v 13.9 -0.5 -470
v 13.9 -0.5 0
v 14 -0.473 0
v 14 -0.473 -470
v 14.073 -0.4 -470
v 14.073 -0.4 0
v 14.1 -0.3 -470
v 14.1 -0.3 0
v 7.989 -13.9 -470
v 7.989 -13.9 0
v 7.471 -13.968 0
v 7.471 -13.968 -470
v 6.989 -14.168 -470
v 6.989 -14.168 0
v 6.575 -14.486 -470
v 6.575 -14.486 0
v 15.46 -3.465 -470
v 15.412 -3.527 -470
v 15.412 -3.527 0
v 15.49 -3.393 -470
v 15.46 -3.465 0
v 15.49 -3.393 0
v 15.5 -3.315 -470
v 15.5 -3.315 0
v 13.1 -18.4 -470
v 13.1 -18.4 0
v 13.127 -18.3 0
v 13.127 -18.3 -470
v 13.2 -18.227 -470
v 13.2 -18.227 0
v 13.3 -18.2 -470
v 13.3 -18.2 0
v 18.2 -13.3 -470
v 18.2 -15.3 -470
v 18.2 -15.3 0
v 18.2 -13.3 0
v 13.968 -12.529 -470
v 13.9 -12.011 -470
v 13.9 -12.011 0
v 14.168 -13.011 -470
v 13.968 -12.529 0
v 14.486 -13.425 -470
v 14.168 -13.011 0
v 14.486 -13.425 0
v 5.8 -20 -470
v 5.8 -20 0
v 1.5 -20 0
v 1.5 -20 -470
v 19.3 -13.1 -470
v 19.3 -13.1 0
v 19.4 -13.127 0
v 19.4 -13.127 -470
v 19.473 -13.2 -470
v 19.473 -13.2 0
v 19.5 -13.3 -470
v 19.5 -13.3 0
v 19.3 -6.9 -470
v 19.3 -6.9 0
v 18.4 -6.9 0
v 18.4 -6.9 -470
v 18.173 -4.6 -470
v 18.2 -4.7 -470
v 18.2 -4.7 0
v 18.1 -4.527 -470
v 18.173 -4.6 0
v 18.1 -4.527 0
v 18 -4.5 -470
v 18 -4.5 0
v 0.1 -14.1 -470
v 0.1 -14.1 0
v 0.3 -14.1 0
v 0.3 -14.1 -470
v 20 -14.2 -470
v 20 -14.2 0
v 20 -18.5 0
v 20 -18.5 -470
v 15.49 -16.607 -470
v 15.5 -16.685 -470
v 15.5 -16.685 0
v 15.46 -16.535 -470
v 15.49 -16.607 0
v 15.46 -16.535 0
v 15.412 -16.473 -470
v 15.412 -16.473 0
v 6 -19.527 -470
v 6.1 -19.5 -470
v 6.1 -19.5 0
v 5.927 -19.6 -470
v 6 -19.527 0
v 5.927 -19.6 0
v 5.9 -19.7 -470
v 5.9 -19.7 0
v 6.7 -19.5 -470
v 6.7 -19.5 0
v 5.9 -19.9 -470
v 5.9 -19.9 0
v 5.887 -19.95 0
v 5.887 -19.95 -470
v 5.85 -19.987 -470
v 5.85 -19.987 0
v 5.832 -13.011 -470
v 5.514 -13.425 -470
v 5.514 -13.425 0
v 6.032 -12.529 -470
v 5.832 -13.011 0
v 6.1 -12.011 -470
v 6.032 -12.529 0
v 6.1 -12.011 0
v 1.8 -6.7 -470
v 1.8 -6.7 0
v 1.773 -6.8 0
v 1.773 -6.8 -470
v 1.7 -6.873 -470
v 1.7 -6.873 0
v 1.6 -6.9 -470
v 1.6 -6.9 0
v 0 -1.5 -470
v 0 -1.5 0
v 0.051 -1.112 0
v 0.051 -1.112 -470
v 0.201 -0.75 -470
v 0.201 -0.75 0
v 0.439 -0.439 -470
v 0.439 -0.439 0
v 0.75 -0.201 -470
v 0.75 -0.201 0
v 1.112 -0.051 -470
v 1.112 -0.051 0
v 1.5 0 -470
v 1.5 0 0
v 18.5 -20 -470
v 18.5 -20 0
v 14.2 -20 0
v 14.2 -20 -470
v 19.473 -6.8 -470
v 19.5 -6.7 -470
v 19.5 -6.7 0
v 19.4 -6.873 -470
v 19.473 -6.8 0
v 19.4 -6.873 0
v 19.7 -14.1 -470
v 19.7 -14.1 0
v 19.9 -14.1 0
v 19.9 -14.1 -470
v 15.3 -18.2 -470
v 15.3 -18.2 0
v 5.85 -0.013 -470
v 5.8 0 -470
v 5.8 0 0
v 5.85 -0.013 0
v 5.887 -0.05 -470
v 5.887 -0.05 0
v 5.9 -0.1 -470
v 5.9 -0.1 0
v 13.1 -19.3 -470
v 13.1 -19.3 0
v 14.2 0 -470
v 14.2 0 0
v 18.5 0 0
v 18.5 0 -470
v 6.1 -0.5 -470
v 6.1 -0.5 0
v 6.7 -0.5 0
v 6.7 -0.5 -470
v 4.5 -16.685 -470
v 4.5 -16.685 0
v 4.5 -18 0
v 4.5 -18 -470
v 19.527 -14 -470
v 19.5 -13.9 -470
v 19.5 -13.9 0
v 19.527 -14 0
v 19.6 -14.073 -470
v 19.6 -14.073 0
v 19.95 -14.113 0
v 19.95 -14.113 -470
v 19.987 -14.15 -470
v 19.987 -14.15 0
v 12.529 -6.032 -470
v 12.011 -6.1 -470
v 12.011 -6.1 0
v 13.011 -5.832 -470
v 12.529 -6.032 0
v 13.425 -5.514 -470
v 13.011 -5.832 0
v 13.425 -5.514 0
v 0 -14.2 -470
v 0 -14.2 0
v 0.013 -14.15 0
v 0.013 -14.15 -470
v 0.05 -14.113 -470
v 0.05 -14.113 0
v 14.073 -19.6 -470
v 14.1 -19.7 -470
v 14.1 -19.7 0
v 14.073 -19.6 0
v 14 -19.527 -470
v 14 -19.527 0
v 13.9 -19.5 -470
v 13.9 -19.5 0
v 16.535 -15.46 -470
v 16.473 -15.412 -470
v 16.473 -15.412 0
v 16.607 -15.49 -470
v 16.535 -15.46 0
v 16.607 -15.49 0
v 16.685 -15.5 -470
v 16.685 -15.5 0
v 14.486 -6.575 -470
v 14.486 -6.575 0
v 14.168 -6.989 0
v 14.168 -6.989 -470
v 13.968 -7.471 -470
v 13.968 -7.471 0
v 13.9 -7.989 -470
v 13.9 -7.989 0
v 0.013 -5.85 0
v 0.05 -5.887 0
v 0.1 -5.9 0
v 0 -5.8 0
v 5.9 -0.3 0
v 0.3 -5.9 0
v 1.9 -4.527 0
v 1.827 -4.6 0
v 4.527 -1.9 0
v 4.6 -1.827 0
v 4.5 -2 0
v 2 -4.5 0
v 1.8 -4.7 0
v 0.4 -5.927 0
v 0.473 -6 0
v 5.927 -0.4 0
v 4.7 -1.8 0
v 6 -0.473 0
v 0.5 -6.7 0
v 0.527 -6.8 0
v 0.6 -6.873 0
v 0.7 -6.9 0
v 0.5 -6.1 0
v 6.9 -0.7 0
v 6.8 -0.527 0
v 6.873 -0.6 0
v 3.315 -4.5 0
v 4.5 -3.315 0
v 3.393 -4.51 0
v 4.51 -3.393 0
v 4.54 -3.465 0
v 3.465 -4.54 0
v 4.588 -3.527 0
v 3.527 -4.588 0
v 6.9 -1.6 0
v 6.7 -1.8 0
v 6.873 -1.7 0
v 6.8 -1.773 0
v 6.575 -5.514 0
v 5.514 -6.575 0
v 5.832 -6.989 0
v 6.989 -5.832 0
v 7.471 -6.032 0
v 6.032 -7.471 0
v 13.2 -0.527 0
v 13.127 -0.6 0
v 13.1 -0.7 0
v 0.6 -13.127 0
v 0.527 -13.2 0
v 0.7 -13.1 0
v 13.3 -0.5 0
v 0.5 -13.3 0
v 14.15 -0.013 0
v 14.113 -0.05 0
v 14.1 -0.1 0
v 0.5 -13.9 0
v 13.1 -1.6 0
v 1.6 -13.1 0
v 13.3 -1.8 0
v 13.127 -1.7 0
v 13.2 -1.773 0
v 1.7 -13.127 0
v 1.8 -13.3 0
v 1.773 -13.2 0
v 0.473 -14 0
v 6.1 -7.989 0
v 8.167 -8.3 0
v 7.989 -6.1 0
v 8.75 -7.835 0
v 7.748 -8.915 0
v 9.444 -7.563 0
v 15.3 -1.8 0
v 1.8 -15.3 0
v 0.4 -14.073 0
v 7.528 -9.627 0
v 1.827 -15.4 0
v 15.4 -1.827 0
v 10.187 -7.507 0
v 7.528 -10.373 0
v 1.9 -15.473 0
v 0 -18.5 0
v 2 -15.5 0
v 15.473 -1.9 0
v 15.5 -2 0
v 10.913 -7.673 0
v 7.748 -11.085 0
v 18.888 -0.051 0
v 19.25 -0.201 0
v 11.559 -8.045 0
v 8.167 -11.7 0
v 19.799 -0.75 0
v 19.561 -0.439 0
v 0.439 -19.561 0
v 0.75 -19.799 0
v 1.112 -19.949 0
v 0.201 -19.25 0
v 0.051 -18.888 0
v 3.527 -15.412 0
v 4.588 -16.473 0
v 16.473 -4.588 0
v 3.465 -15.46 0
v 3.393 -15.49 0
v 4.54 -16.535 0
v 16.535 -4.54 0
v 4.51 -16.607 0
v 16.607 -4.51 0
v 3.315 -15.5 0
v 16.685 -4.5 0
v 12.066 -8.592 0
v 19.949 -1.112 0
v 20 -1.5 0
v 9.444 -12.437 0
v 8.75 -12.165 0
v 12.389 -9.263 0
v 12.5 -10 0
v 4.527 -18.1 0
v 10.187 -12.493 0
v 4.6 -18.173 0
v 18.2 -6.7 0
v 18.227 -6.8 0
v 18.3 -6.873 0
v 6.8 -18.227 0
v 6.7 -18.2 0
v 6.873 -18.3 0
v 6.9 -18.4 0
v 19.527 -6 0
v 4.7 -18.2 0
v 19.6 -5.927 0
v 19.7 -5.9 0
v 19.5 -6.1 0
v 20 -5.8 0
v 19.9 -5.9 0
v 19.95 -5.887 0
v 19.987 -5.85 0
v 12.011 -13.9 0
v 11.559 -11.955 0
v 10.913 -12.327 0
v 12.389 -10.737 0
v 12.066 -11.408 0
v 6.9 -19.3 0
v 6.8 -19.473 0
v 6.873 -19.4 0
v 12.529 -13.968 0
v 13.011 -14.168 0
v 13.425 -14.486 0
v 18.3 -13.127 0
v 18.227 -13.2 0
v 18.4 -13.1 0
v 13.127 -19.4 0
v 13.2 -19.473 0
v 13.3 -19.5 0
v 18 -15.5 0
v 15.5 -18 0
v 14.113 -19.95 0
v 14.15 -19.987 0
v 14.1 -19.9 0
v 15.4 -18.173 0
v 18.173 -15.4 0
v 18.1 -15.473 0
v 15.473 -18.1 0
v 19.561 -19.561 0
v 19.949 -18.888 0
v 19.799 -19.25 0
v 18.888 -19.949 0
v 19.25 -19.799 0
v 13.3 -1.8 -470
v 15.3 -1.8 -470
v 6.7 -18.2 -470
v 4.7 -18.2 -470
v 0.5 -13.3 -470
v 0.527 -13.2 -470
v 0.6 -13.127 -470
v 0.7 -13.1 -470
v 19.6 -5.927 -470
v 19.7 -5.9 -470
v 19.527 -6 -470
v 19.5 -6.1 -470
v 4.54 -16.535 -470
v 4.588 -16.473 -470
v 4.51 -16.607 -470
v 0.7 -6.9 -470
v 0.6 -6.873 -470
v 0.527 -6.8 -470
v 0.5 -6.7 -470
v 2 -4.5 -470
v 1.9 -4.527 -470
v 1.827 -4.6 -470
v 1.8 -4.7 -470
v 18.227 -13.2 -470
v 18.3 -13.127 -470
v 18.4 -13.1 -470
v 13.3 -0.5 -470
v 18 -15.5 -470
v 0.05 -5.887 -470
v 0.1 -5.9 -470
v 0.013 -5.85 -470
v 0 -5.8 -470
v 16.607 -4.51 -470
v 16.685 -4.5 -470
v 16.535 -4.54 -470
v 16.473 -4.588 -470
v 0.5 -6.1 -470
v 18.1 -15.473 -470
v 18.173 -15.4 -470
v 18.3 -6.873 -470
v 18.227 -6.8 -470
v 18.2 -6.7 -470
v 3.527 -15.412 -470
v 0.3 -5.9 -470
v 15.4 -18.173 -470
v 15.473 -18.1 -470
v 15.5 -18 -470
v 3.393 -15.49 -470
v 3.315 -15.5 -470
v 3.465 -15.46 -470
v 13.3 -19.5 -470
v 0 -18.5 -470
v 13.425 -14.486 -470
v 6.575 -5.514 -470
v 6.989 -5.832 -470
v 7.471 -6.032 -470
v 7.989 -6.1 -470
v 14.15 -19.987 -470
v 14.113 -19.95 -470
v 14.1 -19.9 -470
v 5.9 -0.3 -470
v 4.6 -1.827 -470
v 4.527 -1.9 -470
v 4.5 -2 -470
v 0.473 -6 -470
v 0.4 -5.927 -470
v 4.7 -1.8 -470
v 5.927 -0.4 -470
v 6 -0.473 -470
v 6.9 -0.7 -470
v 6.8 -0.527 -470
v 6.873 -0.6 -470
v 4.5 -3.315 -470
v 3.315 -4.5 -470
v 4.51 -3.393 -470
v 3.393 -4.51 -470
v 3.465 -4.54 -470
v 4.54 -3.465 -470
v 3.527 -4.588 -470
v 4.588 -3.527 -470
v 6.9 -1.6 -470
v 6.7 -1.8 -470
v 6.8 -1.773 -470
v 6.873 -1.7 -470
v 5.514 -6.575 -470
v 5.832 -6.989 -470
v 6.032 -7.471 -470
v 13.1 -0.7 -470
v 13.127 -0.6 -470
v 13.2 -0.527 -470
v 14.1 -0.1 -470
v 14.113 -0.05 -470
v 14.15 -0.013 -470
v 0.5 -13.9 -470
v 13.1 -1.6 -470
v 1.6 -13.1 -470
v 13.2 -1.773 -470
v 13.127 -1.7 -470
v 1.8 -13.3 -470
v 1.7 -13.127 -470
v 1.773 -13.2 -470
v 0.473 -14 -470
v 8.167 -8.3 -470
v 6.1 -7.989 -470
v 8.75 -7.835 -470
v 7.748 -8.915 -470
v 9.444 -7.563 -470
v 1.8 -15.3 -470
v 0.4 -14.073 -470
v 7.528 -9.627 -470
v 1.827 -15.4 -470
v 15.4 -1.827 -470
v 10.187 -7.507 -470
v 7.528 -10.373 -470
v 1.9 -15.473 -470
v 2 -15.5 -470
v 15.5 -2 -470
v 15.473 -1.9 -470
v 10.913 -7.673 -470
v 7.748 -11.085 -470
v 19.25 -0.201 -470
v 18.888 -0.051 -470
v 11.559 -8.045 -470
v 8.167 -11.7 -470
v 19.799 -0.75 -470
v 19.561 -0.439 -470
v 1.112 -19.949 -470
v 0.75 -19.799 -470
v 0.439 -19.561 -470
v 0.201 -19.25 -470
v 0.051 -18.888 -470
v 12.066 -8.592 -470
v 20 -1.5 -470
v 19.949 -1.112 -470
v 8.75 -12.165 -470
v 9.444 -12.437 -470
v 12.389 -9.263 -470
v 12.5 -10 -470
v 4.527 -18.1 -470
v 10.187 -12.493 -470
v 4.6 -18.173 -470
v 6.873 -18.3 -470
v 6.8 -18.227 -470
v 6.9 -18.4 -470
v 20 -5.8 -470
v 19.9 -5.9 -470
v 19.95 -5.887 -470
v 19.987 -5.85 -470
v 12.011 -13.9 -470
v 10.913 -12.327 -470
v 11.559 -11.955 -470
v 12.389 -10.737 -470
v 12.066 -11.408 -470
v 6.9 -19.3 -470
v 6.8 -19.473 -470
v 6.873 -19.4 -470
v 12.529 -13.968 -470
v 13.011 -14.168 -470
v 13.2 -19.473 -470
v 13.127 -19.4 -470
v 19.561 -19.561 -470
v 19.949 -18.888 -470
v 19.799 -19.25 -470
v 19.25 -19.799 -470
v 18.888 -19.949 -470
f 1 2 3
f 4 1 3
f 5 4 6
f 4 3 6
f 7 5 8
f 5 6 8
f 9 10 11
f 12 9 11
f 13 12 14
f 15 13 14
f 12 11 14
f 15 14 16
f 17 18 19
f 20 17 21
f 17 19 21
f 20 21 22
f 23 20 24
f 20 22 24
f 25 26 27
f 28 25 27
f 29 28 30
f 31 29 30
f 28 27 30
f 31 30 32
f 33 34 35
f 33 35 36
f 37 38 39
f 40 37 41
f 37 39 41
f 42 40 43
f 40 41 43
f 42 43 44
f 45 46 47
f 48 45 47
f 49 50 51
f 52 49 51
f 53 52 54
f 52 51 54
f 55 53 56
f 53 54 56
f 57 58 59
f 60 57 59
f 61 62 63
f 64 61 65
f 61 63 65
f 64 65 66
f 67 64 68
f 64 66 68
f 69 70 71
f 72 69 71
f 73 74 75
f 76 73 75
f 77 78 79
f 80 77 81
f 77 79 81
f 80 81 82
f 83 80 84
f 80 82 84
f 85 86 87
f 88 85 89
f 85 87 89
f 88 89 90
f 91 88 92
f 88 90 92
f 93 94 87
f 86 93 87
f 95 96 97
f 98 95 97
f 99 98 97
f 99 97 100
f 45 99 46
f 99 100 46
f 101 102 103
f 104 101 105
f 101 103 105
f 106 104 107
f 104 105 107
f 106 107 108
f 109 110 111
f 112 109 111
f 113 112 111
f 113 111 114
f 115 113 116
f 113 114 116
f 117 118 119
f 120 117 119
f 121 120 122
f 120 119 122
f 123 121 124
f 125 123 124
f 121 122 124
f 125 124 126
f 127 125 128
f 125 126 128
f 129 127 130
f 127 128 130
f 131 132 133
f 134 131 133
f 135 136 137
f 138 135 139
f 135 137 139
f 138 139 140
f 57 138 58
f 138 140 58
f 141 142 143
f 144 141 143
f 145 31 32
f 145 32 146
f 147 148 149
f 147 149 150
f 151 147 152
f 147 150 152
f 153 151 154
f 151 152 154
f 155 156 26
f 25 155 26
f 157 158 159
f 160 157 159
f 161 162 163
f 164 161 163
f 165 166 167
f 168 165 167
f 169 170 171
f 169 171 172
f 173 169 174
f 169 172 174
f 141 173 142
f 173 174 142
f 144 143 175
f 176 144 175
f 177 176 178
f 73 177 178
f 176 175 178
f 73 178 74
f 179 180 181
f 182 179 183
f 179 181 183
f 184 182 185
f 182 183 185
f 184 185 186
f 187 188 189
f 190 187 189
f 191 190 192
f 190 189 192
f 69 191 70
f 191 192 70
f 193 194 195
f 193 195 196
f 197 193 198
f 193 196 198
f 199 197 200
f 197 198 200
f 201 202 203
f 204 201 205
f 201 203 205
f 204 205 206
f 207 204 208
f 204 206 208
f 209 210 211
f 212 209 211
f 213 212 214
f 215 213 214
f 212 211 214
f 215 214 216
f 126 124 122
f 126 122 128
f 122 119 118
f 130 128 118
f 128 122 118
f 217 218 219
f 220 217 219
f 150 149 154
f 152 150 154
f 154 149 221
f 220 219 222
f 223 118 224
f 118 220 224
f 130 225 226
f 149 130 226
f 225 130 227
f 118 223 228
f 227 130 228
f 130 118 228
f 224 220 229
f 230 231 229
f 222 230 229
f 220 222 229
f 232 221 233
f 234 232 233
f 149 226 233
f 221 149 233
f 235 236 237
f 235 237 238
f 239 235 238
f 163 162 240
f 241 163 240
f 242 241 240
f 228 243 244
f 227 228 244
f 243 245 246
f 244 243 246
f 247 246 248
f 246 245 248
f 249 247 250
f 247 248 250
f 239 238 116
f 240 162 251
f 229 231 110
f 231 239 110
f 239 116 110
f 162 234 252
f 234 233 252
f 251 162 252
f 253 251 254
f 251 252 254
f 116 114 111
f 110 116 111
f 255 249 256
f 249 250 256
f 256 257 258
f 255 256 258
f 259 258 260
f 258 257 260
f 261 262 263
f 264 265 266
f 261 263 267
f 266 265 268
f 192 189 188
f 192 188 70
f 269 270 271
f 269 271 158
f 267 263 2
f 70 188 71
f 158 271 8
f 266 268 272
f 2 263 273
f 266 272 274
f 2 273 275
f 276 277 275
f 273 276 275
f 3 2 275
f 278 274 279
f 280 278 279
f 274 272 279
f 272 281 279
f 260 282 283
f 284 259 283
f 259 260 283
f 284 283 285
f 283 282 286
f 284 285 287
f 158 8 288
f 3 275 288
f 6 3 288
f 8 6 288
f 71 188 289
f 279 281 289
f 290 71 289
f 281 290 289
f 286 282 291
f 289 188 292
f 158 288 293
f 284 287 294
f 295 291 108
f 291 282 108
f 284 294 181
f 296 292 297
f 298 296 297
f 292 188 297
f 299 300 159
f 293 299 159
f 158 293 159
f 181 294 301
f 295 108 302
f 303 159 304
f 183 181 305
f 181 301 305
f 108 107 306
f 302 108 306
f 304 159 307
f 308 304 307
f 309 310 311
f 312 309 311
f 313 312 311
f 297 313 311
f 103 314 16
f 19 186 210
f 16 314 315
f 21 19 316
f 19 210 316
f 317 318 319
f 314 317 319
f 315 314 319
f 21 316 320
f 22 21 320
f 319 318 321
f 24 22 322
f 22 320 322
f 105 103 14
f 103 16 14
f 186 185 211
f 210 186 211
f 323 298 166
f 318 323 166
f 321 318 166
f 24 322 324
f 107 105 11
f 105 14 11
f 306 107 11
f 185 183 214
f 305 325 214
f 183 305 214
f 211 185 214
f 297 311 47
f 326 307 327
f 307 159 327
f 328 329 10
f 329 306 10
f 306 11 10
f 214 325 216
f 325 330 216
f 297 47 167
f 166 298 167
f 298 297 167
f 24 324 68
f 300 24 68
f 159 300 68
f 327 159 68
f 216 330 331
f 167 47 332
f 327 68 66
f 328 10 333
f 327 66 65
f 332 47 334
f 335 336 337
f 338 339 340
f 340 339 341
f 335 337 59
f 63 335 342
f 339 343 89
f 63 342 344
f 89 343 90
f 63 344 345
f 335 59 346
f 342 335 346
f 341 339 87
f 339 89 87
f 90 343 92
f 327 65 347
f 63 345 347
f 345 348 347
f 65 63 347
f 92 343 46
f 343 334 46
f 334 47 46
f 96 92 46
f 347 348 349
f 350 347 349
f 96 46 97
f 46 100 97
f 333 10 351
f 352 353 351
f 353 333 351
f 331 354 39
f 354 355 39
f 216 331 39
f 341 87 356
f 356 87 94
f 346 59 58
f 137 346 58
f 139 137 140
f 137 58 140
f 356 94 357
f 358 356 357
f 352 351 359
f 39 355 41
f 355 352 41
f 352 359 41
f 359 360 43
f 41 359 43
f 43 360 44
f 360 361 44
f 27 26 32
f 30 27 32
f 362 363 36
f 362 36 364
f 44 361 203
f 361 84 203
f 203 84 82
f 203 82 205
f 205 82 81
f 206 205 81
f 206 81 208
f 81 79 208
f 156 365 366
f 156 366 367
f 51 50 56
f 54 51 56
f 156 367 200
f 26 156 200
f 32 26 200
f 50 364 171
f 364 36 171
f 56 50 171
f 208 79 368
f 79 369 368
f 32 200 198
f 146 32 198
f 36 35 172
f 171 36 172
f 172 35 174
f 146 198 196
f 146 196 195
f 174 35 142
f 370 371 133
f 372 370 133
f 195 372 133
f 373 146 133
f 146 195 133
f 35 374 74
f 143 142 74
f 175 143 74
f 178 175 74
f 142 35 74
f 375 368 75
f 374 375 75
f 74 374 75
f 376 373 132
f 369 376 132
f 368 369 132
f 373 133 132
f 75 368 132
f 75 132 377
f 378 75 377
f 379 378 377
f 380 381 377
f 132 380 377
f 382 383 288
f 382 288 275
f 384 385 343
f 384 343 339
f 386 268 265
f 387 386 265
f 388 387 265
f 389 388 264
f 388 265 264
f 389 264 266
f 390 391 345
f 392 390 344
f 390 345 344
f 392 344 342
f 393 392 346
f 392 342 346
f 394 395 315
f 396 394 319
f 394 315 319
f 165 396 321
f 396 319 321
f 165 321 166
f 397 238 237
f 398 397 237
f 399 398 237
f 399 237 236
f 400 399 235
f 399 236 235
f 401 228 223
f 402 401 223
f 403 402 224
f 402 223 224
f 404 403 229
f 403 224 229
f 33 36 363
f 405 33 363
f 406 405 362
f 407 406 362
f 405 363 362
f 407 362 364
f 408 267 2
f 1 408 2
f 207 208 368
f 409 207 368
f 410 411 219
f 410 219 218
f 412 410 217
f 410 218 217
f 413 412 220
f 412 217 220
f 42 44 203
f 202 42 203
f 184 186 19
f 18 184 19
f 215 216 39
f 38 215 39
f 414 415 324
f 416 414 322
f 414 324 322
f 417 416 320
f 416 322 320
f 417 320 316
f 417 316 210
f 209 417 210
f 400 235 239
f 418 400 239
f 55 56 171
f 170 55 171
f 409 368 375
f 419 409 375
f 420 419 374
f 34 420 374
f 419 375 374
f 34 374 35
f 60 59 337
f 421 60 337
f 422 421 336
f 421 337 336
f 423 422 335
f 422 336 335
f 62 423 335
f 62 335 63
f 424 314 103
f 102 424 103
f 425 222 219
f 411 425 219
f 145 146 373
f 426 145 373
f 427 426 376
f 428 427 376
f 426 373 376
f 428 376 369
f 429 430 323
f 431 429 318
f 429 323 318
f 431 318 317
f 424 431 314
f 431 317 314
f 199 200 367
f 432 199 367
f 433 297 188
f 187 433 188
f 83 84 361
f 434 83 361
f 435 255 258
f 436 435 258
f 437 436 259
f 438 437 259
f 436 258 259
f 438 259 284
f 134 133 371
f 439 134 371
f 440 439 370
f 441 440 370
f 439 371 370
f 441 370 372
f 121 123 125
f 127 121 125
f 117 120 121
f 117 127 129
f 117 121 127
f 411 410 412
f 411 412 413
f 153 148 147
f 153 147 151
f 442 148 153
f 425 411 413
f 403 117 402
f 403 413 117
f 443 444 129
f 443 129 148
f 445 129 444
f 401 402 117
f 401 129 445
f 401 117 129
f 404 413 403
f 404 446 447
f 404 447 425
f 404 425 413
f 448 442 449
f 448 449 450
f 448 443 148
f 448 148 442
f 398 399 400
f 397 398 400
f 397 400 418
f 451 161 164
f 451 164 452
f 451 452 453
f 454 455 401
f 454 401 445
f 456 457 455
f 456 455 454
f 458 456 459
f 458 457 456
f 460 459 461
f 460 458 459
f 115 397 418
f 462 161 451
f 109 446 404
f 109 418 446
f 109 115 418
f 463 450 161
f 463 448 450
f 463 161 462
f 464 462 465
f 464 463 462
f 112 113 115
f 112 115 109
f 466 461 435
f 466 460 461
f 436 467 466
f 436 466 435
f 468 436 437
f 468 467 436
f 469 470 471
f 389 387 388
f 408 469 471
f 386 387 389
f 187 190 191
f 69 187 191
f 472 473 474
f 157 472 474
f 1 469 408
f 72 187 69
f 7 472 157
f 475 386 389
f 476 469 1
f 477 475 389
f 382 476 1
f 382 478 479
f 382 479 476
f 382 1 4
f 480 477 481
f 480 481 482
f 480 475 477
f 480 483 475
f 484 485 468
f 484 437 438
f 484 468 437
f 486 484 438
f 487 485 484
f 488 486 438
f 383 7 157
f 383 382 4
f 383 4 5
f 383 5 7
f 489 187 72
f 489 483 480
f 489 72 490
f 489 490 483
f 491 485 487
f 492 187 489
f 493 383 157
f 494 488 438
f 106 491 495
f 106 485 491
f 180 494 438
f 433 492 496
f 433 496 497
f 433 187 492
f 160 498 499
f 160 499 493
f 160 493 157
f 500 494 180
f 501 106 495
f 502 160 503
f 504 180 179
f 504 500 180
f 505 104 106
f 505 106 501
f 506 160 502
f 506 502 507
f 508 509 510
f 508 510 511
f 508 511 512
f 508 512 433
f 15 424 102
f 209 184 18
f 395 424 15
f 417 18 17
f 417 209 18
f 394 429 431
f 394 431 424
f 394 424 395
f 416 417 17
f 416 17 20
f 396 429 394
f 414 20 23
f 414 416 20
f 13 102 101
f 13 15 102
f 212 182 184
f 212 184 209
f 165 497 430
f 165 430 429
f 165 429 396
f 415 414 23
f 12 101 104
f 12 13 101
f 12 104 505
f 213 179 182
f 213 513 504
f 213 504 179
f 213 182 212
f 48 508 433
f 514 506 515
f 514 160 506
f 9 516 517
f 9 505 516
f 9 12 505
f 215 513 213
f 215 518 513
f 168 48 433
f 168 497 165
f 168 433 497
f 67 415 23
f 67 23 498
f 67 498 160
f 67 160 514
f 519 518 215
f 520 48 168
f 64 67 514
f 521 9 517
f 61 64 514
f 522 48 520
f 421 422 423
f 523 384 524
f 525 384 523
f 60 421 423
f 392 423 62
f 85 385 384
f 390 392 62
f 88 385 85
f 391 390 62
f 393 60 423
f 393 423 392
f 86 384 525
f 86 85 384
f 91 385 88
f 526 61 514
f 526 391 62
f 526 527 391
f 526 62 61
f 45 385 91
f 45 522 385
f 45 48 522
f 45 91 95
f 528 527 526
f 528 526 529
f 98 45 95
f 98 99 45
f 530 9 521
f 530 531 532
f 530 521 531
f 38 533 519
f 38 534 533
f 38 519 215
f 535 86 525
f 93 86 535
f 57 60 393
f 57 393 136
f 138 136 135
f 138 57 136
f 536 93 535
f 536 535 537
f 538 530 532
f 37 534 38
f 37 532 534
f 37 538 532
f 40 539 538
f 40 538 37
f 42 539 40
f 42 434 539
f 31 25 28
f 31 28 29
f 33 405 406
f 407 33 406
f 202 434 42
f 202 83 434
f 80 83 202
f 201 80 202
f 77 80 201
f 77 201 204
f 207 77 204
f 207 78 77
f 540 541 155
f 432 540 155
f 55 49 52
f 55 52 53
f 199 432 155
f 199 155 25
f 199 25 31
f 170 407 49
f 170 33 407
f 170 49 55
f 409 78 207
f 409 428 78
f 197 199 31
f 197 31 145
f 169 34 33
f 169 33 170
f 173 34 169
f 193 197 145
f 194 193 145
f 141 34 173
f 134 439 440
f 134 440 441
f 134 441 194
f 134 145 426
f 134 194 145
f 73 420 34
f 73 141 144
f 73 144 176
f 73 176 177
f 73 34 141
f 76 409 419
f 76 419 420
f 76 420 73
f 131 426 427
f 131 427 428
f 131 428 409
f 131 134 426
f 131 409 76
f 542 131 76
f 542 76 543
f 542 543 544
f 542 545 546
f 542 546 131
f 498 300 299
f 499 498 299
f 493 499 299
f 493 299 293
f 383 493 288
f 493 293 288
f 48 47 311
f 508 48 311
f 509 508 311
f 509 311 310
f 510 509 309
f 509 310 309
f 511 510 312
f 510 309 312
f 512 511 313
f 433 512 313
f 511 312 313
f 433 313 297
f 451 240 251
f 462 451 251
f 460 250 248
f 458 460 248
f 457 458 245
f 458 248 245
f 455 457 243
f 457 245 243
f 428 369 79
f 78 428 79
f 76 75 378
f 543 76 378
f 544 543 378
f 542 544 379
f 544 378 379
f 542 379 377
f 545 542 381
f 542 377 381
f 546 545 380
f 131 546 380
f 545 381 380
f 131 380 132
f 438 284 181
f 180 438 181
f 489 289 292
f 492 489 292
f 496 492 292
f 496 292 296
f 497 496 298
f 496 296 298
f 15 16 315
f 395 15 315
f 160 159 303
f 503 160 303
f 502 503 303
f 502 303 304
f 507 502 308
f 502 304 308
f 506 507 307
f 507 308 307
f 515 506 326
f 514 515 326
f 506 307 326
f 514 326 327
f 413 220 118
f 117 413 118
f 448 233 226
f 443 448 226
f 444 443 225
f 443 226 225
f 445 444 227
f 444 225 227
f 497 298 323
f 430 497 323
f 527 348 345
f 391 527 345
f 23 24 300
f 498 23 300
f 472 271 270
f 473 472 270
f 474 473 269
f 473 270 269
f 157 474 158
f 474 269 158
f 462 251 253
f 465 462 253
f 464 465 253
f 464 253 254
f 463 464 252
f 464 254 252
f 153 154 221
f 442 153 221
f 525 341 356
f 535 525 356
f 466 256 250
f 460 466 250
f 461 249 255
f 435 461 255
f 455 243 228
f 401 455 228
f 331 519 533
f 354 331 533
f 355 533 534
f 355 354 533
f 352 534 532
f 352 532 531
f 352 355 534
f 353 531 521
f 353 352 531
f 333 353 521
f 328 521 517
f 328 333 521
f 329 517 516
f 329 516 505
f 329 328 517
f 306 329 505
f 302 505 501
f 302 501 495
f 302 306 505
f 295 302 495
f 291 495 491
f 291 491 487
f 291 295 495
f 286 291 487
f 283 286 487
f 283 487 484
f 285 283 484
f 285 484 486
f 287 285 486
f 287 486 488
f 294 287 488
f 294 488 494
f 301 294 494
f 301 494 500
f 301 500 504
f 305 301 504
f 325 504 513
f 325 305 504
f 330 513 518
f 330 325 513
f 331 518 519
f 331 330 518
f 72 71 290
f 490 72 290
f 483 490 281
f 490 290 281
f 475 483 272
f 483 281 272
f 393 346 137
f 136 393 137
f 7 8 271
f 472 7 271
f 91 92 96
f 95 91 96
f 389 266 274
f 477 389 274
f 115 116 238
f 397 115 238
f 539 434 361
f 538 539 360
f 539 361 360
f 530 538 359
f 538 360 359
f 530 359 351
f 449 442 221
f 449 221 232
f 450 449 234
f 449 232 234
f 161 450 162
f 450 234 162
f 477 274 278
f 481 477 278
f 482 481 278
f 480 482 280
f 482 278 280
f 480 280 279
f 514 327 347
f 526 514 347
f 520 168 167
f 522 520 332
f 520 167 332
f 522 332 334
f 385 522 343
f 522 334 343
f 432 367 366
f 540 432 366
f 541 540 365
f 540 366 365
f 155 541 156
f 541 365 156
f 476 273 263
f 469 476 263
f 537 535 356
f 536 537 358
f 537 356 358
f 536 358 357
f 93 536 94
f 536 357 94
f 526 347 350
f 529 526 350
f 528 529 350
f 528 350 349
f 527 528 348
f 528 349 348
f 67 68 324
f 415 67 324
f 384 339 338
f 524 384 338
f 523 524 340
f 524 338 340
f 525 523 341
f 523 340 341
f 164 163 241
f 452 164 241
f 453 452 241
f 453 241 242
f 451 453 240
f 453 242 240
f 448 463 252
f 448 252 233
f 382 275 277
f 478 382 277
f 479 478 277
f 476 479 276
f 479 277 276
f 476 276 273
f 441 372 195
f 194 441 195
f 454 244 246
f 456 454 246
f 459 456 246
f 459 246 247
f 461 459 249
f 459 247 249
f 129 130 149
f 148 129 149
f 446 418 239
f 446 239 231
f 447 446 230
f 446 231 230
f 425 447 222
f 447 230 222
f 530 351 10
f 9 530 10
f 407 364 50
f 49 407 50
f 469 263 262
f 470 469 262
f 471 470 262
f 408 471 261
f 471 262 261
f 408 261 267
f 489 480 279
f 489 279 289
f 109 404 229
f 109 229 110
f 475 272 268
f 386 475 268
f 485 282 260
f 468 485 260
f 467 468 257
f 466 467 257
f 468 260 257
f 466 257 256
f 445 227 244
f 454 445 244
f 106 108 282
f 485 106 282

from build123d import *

# Parameters (mm, degrees)
SKETCH1_R           = 2.5
BOSS_EXTRUDE1_DEPTH = 470


with BuildPart() as part:
    # Sketch1 → Boss-Extrude1 (new body)
    with BuildSketch(Plane(origin=(0, 0, 0), x_dir=(1, 0, 0), z_dir=(0, 0, -1))):
        with BuildLine():
            Line((1.5, 0), (5.8, 0))
            ThreePointArc((5.8, 0), (5.870710678, 0.029289322), (5.9, 0.1))
            Line((5.9, 0.1), (5.9, 0.3))
            ThreePointArc((5.9, 0.3), (5.958578644, 0.441421356), (6.1, 0.5))
            Line((6.1, 0.5), (6.7, 0.5))
            ThreePointArc((6.7, 0.5), (6.841421356, 0.558578644), (6.9, 0.7))
            Line((6.9, 0.7), (6.9, 1.6))
            ThreePointArc((6.9, 1.6), (6.841421356, 1.741421356), (6.7, 1.8))
            Line((6.7, 1.8), (4.7, 1.8))
            ThreePointArc((4.7, 1.8), (4.558578644, 1.858578644), (4.5, 2))
            Line((4.5, 2), (4.5, 3.31507576))
            ThreePointArc((4.5, 3.31507576), (4.52283614, 3.429880789), (4.587867966, 3.527207794))
            Line((4.587867966, 3.527207794), (6.574873734, 5.514213562))
            ThreePointArc((6.574873734, 5.514213562), (7.223720432, 5.947759065), (7.989087297, 6.1))
            Line((7.989087297, 6.1), (12.010912703, 6.1))
            ThreePointArc((12.010912703, 6.1), (12.776279568, 5.947759065), (13.425126266, 5.514213562))
            Line((13.425126266, 5.514213562), (15.412132034, 3.527207794))
            ThreePointArc((15.412132034, 3.527207794), (15.47716386, 3.429880789), (15.5, 3.31507576))
            Line((15.5, 3.31507576), (15.5, 2))
            ThreePointArc((15.5, 2), (15.441421356, 1.858578644), (15.3, 1.8))
            Line((15.3, 1.8), (13.3, 1.8))
            ThreePointArc((13.3, 1.8), (13.158578644, 1.741421356), (13.1, 1.6))
            Line((13.1, 1.6), (13.1, 0.7))
            ThreePointArc((13.1, 0.7), (13.158578644, 0.558578644), (13.3, 0.5))
            Line((13.3, 0.5), (13.9, 0.5))
            ThreePointArc((13.9, 0.5), (14.041421356, 0.441421356), (14.1, 0.3))
            Line((14.1, 0.3), (14.1, 0.1))
            ThreePointArc((14.1, 0.1), (14.129289322, 0.029289322), (14.2, 0))
            Line((14.2, 0), (18.5, 0))
            ThreePointArc((18.5, 0), (19.560660172, 0.439339828), (20, 1.5))
            Line((20, 1.5), (20, 5.8))
            ThreePointArc((20, 5.8), (19.970710678, 5.870710678), (19.9, 5.9))
            Line((19.9, 5.9), (19.7, 5.9))
            ThreePointArc((19.7, 5.9), (19.558578644, 5.958578644), (19.5, 6.1))
            Line((19.5, 6.1), (19.5, 6.7))
            ThreePointArc((19.5, 6.7), (19.441421356, 6.841421356), (19.3, 6.9))
            Line((19.3, 6.9), (18.4, 6.9))
            ThreePointArc((18.4, 6.9), (18.258578644, 6.841421356), (18.2, 6.7))
            Line((18.2, 6.7), (18.2, 4.7))
            ThreePointArc((18.2, 4.7), (18.141421356, 4.558578644), (18, 4.5))
            Line((18, 4.5), (16.68492424, 4.5))
            ThreePointArc((16.68492424, 4.5), (16.570119211, 4.52283614), (16.472792206, 4.587867966))
            Line((16.472792206, 4.587867966), (14.485786438, 6.574873734))
            ThreePointArc((14.485786438, 6.574873734), (14.052240935, 7.223720432), (13.9, 7.989087297))
            Line((13.9, 7.989087297), (13.9, 12.010912703))
            ThreePointArc((13.9, 12.010912703), (14.052240935, 12.776279568), (14.485786438, 13.425126266))
            Line((14.485786438, 13.425126266), (16.472792206, 15.412132034))
            ThreePointArc((16.472792206, 15.412132034), (16.570119211, 15.47716386), (16.68492424, 15.5))
            Line((16.68492424, 15.5), (18, 15.5))
            ThreePointArc((18, 15.5), (18.141421356, 15.441421356), (18.2, 15.3))
            Line((18.2, 15.3), (18.2, 13.3))
            ThreePointArc((18.2, 13.3), (18.258578644, 13.158578644), (18.4, 13.1))
            Line((18.4, 13.1), (19.3, 13.1))
            ThreePointArc((19.3, 13.1), (19.441421356, 13.158578644), (19.5, 13.3))
            Line((19.5, 13.3), (19.5, 13.9))
            ThreePointArc((19.5, 13.9), (19.558578644, 14.041421356), (19.7, 14.1))
            Line((19.7, 14.1), (19.9, 14.1))
            ThreePointArc((19.9, 14.1), (19.970710678, 14.129289322), (20, 14.2))
            Line((20, 14.2), (20, 18.5))
            ThreePointArc((20, 18.5), (19.560660172, 19.560660172), (18.5, 20))
            Line((18.5, 20), (14.2, 20))
            ThreePointArc((14.2, 20), (14.129289322, 19.970710678), (14.1, 19.9))
            Line((14.1, 19.9), (14.1, 19.7))
            ThreePointArc((14.1, 19.7), (14.041421356, 19.558578644), (13.9, 19.5))
            Line((13.9, 19.5), (13.3, 19.5))
            ThreePointArc((13.3, 19.5), (13.158578644, 19.441421356), (13.1, 19.3))
            Line((13.1, 19.3), (13.1, 18.4))
            ThreePointArc((13.1, 18.4), (13.158578644, 18.258578644), (13.3, 18.2))
            Line((13.3, 18.2), (15.3, 18.2))
            ThreePointArc((15.3, 18.2), (15.441421356, 18.141421356), (15.5, 18))
            Line((15.5, 18), (15.5, 16.68492424))
            ThreePointArc((15.5, 16.68492424), (15.47716386, 16.570119211), (15.412132034, 16.472792206))
            Line((15.412132034, 16.472792206), (13.425126266, 14.485786438))
            ThreePointArc((13.425126266, 14.485786438), (12.776279568, 14.052240935), (12.010912703, 13.9))
            Line((12.010912703, 13.9), (7.989087297, 13.9))
            ThreePointArc((7.989087297, 13.9), (7.223720432, 14.052240935), (6.574873734, 14.485786438))
            Line((6.574873734, 14.485786438), (4.587867966, 16.472792206))
            ThreePointArc((4.587867966, 16.472792206), (4.52283614, 16.570119211), (4.5, 16.68492424))
            Line((4.5, 16.68492424), (4.5, 18))
            ThreePointArc((4.5, 18), (4.558578644, 18.141421356), (4.7, 18.2))
            Line((4.7, 18.2), (6.7, 18.2))
            ThreePointArc((6.7, 18.2), (6.841421356, 18.258578644), (6.9, 18.4))
            Line((6.9, 18.4), (6.9, 19.3))
            ThreePointArc((6.9, 19.3), (6.841421356, 19.441421356), (6.7, 19.5))
            Line((6.7, 19.5), (6.1, 19.5))
            ThreePointArc((6.1, 19.5), (5.958578644, 19.558578644), (5.9, 19.7))
            Line((5.9, 19.7), (5.9, 19.9))
            ThreePointArc((5.9, 19.9), (5.870710678, 19.970710678), (5.8, 20))
            Line((5.8, 20), (1.5, 20))
            ThreePointArc((1.5, 20), (0.439339828, 19.560660172), (0, 18.5))
            Line((0, 18.5), (0, 14.2))
            ThreePointArc((0, 14.2), (0.029289322, 14.129289322), (0.1, 14.1))
            Line((0.1, 14.1), (0.3, 14.1))
            ThreePointArc((0.3, 14.1), (0.441421356, 14.041421356), (0.5, 13.9))
            Line((0.5, 13.9), (0.5, 13.3))
            ThreePointArc((0.5, 13.3), (0.558578644, 13.158578644), (0.7, 13.1))
            Line((0.7, 13.1), (1.6, 13.1))
            ThreePointArc((1.6, 13.1), (1.741421356, 13.158578644), (1.8, 13.3))
            Line((1.8, 13.3), (1.8, 15.3))
            ThreePointArc((1.8, 15.3), (1.858578644, 15.441421356), (2, 15.5))
            Line((2, 15.5), (3.31507576, 15.5))
            ThreePointArc((3.31507576, 15.5), (3.429880789, 15.47716386), (3.527207794, 15.412132034))
            Line((3.527207794, 15.412132034), (5.514213562, 13.425126266))
            ThreePointArc((5.514213562, 13.425126266), (5.947759065, 12.776279568), (6.1, 12.010912703))
            Line((6.1, 12.010912703), (6.1, 7.989087297))
            ThreePointArc((6.1, 7.989087297), (5.947759065, 7.223720432), (5.514213562, 6.574873734))
            Line((5.514213562, 6.574873734), (3.527207794, 4.587867966))
            ThreePointArc((3.527207794, 4.587867966), (3.429880789, 4.52283614), (3.31507576, 4.5))
            Line((3.31507576, 4.5), (2, 4.5))
            ThreePointArc((2, 4.5), (1.858578644, 4.558578644), (1.8, 4.7))
            Line((1.8, 4.7), (1.8, 6.7))
            ThreePointArc((1.8, 6.7), (1.741421356, 6.841421356), (1.6, 6.9))
            Line((1.6, 6.9), (0.7, 6.9))
            ThreePointArc((0.7, 6.9), (0.558578644, 6.841421356), (0.5, 6.7))
            Line((0.5, 6.7), (0.5, 6.1))
            ThreePointArc((0.5, 6.1), (0.441421356, 5.958578644), (0.3, 5.9))
            Line((0.3, 5.9), (0.1, 5.9))
            ThreePointArc((0.1, 5.9), (0.029289322, 5.870710678), (0, 5.8))
            Line((0, 5.8), (0, 1.5))
            ThreePointArc((0, 1.5), (0.439339828, 0.439339828), (1.5, 0))
        make_face()
        with Locations((10, 10)):
            Circle(SKETCH1_R, mode=Mode.SUBTRACT)
    extrude(amount=BOSS_EXTRUDE1_DEPTH)


solid = part.part
